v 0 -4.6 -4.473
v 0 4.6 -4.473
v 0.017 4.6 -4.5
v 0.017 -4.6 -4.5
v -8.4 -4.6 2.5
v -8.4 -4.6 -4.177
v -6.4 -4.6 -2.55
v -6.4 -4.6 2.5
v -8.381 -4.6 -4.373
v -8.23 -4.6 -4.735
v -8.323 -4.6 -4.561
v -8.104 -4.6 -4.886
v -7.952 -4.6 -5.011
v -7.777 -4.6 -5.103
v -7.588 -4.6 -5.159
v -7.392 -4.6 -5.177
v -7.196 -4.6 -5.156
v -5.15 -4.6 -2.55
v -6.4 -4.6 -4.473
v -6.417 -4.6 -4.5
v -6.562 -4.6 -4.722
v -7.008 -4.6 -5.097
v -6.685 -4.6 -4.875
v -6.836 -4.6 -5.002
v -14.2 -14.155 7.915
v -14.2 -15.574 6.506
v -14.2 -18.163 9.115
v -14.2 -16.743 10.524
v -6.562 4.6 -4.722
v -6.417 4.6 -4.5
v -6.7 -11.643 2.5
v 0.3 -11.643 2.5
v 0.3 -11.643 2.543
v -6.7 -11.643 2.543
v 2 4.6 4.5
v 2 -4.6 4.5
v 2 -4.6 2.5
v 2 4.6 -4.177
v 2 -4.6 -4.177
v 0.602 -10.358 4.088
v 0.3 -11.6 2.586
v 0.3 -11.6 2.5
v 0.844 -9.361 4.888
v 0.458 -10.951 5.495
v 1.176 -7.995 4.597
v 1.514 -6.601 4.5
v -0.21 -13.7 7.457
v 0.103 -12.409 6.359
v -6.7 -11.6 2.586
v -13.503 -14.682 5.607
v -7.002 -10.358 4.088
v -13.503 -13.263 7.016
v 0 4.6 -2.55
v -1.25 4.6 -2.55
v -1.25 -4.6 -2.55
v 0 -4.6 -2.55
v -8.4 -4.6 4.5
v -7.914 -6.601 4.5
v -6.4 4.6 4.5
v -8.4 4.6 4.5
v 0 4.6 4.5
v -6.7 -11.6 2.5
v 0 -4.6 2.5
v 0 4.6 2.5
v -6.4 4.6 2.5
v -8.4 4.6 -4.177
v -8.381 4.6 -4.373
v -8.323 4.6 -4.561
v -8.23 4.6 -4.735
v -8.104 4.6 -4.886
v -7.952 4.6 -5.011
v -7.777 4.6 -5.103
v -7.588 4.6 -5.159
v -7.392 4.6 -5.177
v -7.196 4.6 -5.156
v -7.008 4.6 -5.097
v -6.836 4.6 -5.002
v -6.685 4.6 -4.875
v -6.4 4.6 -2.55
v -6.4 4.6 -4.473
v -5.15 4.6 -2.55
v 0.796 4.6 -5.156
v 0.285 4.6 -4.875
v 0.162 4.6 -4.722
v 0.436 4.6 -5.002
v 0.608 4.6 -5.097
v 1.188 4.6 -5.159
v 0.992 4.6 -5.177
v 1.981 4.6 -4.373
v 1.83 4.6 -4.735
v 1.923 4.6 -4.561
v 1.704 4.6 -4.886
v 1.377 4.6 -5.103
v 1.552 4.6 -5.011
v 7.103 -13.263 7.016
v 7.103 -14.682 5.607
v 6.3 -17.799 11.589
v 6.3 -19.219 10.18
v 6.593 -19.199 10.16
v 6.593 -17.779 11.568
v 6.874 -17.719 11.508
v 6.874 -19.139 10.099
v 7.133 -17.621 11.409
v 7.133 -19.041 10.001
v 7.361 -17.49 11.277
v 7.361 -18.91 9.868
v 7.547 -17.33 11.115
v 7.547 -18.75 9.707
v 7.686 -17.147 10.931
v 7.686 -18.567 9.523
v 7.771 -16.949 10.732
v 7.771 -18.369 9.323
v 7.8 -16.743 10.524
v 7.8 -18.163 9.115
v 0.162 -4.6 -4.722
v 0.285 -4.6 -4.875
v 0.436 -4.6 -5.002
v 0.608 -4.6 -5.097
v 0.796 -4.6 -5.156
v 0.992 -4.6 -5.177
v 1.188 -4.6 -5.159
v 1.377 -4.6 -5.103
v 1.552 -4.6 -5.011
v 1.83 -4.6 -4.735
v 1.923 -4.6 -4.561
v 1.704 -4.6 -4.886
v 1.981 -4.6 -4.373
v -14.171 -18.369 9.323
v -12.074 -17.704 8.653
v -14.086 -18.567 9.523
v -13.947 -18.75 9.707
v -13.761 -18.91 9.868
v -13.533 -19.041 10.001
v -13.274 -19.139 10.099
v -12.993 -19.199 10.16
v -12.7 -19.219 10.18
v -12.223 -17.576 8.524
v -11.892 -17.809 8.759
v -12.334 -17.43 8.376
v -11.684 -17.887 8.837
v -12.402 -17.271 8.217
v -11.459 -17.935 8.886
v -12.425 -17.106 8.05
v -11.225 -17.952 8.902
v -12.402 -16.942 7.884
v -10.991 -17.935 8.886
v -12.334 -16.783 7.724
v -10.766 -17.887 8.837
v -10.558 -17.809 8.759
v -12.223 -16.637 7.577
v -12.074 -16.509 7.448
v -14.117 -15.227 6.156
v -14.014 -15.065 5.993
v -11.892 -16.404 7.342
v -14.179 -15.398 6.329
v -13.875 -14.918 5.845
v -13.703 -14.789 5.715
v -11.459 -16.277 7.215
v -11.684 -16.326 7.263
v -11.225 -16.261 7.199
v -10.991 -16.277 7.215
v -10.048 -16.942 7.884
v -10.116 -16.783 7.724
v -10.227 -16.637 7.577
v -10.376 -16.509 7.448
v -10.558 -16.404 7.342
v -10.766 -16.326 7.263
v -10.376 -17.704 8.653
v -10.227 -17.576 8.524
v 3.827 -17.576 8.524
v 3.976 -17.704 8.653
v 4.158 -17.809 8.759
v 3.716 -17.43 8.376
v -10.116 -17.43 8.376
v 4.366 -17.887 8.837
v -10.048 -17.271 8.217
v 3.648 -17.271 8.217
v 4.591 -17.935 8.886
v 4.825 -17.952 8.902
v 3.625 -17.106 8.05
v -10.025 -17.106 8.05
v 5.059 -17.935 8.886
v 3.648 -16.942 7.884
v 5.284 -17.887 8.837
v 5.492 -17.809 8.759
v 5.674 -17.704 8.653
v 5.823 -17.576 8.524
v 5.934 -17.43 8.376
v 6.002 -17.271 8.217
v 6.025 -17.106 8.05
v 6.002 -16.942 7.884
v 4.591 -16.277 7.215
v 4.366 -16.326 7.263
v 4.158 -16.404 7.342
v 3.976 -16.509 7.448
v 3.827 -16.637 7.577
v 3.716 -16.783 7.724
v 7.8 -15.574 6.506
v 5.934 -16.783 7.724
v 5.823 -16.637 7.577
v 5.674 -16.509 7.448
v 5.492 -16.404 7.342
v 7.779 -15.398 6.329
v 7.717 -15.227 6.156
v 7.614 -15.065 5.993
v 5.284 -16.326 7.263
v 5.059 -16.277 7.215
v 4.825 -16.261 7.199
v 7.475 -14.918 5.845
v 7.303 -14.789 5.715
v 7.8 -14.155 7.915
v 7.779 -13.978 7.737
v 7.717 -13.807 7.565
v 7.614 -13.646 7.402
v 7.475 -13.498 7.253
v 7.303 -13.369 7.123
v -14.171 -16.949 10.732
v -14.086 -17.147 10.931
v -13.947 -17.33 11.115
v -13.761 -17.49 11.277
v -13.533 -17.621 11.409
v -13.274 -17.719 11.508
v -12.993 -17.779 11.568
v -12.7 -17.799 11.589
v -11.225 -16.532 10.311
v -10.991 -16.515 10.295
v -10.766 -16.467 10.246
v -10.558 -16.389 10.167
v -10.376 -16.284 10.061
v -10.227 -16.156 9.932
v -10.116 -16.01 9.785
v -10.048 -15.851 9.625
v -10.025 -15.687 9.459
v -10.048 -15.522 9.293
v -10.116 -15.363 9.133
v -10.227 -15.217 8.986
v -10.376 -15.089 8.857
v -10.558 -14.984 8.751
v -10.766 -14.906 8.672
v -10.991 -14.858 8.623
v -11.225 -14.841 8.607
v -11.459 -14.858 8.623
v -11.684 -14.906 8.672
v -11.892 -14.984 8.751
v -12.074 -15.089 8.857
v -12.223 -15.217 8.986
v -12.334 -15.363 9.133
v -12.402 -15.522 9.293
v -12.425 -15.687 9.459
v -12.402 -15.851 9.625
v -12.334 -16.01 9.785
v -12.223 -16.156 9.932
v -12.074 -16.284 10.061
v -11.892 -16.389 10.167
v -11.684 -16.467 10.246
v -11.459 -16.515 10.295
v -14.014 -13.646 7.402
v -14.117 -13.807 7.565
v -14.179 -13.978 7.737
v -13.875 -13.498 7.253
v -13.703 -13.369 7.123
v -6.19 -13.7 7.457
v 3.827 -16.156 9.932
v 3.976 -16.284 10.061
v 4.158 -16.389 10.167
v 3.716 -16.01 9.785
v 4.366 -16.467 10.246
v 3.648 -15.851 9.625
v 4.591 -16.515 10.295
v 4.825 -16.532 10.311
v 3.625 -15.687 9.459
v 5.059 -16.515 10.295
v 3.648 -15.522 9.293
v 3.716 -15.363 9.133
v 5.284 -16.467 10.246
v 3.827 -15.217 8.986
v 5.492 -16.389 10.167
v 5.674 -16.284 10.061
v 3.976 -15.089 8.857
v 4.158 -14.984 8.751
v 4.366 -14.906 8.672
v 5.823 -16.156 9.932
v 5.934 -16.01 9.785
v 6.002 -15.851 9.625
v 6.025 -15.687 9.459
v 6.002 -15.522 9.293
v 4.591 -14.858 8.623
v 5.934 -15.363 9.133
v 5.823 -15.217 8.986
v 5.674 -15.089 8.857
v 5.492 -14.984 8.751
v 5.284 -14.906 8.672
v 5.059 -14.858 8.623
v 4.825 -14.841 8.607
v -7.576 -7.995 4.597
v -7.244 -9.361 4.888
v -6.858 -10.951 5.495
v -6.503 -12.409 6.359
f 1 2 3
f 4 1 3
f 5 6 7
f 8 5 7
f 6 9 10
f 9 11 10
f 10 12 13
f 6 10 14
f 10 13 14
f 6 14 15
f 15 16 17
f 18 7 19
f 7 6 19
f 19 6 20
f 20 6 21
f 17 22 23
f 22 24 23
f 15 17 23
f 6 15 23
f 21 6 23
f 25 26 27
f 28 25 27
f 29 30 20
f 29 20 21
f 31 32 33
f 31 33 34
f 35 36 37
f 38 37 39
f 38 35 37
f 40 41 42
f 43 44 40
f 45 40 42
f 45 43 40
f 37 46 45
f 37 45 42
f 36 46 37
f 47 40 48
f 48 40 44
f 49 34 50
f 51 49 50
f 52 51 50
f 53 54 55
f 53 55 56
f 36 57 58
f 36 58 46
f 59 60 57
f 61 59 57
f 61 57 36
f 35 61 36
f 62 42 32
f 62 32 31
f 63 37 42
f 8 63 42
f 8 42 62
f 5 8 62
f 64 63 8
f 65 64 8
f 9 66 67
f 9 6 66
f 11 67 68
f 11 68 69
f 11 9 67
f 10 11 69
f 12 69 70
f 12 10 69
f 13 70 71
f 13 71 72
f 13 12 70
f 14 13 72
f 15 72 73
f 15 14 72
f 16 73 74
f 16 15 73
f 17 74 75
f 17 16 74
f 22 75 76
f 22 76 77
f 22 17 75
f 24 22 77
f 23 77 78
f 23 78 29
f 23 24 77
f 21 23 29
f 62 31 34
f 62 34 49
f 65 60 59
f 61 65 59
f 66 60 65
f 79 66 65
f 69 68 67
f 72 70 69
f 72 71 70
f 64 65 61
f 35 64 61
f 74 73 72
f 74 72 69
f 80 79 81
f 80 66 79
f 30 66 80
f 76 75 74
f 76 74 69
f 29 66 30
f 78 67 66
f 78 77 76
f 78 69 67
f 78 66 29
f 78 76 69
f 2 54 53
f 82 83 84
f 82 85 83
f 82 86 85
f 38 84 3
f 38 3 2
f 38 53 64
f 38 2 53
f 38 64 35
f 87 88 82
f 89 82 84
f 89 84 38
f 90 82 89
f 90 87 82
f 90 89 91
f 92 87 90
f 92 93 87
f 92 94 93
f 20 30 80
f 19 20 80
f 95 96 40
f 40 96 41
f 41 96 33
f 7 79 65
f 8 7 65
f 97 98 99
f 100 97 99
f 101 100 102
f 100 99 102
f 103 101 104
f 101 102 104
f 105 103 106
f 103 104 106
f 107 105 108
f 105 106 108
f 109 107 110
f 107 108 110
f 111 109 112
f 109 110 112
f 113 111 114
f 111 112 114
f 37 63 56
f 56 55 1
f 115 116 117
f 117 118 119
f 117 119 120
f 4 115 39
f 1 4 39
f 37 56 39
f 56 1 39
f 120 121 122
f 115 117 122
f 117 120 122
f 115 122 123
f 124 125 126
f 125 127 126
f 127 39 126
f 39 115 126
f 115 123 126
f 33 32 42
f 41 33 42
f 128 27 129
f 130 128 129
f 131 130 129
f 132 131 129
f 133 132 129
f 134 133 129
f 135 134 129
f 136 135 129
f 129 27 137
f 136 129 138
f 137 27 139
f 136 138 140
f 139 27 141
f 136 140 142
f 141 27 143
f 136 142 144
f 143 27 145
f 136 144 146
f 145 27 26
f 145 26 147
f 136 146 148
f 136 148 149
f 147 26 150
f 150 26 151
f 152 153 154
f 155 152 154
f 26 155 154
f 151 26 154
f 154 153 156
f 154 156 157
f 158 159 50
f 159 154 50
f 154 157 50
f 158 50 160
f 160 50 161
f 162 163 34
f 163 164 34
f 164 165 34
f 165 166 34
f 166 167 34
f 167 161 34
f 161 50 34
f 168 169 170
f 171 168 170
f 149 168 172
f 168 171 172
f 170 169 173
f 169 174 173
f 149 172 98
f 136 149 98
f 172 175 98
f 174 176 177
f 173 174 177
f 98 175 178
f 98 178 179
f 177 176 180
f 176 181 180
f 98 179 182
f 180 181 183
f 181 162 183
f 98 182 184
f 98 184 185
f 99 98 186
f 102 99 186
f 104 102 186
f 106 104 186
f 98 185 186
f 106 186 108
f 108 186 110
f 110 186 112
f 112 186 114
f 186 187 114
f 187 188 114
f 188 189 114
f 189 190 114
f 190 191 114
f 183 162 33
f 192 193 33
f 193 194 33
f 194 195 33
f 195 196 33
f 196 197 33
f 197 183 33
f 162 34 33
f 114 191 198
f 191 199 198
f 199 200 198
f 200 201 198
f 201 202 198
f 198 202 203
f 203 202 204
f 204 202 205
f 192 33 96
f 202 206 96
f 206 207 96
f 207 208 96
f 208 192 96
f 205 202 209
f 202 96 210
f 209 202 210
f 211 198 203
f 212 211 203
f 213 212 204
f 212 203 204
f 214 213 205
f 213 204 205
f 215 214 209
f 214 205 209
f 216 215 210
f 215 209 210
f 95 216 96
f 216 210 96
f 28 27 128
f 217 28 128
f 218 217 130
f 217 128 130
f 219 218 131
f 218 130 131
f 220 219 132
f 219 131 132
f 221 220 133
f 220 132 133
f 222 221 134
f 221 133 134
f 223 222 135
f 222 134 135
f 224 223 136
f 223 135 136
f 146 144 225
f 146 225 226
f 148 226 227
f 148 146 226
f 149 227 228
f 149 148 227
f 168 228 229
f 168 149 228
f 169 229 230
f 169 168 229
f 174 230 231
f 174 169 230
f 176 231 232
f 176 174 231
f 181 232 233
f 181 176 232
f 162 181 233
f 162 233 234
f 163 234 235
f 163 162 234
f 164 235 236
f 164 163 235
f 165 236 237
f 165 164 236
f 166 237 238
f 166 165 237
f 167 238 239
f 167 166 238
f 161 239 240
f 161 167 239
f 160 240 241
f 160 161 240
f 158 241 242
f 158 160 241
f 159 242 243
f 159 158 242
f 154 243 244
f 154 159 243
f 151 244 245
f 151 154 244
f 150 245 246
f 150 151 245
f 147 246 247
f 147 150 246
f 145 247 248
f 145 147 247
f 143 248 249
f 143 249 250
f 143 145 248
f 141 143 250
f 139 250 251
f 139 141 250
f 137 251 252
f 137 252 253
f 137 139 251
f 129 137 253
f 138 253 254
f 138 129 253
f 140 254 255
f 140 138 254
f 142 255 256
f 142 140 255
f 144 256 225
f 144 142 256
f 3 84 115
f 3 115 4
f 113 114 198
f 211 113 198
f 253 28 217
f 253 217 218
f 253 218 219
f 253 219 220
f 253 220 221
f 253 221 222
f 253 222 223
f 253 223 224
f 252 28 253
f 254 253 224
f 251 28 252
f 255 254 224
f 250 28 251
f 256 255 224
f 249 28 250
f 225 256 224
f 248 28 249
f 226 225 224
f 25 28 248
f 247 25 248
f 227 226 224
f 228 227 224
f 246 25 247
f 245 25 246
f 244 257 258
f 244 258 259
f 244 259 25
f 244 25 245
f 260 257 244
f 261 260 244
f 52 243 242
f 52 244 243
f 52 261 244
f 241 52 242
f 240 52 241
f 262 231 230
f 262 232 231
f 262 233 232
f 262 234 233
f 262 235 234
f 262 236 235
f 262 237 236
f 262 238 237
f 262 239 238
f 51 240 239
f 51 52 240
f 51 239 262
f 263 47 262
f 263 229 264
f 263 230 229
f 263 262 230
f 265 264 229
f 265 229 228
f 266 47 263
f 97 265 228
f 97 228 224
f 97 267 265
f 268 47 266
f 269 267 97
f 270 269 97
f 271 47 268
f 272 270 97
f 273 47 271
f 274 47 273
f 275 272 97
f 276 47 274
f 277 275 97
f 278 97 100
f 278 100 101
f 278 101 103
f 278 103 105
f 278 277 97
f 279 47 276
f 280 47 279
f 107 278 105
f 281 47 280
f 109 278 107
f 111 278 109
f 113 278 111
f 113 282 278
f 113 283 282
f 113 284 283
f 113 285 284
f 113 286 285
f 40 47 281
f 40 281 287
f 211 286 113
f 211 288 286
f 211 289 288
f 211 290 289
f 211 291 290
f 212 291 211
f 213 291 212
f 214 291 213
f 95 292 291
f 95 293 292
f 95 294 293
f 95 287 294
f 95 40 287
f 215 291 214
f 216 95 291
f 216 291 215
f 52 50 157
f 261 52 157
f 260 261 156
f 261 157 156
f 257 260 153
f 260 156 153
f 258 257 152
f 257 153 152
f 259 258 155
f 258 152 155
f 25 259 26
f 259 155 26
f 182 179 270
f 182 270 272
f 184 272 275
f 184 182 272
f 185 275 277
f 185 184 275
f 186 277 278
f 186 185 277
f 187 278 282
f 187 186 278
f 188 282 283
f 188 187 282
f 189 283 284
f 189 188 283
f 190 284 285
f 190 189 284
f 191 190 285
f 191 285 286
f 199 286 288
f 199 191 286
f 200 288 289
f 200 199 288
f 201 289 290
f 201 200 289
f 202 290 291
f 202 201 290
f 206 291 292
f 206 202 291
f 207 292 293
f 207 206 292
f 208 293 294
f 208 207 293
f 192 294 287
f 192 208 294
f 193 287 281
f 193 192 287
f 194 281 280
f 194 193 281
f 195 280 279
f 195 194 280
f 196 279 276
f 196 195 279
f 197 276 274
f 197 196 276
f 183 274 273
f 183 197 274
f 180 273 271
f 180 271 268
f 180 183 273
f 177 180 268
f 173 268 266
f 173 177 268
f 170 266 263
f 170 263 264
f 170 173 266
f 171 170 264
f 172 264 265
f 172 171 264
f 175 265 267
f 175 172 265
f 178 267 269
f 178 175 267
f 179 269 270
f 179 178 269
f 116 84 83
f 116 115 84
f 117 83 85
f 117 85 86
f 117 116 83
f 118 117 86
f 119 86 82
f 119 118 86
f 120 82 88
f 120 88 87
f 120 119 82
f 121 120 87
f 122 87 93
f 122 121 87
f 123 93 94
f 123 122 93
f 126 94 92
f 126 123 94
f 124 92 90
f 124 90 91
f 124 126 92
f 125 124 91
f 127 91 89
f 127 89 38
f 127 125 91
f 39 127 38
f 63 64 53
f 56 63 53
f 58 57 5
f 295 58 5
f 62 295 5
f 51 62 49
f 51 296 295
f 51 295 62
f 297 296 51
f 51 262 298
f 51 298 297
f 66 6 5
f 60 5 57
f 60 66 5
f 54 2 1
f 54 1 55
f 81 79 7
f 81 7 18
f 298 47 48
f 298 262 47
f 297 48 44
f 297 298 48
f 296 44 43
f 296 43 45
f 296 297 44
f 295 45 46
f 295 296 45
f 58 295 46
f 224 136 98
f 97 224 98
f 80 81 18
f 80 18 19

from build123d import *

# Parameters (mm, degrees)
SKETCH2_W           = 8.999610642
SKETCH2_H           = 9.2
BOSS_EXTRUDE1_DEPTH = 2
BOSS_EXTRUDE2_START = 6.4
SKETCH3_W           = 8.999610642
SKETCH3_H           = 9.2
BOSS_EXTRUDE2_DEPTH = 2
SKETCH4_W           = 1.999805321
SKETCH4_H           = 9.2
BOSS_EXTRUDE3_DEPTH = 7
CUT_EXTRUDE2_DEPTH  = 9.2
BOSS_EXTRUDE4_DEPTH = 9.2
FILLET1_R           = 1
BOSS_EXTRUDE6_DEPTH = 1.999805321
SKETCH11_R          = 1.2
BOSS_EXTRUDE7_DEPTH = 2
FILLET2_R           = 10
SKETCH13_W          = 7
SKETCH13_H          = 0.042993575
BOSS_EXTRUDE8_DEPTH = 1


with BuildPart() as part:
    # Sketch2 → Boss-Extrude1 (new body)
    with BuildSketch(Plane(origin=(0, 0, 0), x_dir=(0, 0, -1), z_dir=(1, 0, 0))):
        Rectangle(SKETCH2_W, SKETCH2_H)
    extrude(amount=BOSS_EXTRUDE1_DEPTH)



with BuildPart() as body_2:
    # Sketch3 → Boss-Extrude2 (new body)
    with BuildSketch(Plane.ZY.offset(BOSS_EXTRUDE2_START)):
        Rectangle(SKETCH3_W, SKETCH3_H)
    extrude(amount=BOSS_EXTRUDE2_DEPTH)


with BuildPart() as part_1:
    add(part.part)

    add(body_2.part)  # Boss-Extrude3 merges body 2
    # Sketch4 → Boss-Extrude3 (add)
    with BuildSketch(Plane.ZY):
        with Locations((3.499902661, 0)):
            Rectangle(SKETCH4_W, SKETCH4_H)
    extrude(amount=BOSS_EXTRUDE3_DEPTH)

    # Sketch5 → Cut-Extrude2 (cut)
    with BuildSketch(Plane(origin=(0, 4.6, 0), x_dir=(1, 0, 0), z_dir=(0, 1, 0))):
        Polygon((-5.15, 2.55), (-1.25, 2.55), (0, 4.473076923), (0, 4.499805321), (0.017373458, 4.499805321), (2, 7.55), (-8.4, 7.55), (-6.417373458, 4.499805321), (-6.4, 4.499805321), (-6.4, 4.473076923), align=None)
        Polygon((0, 4.499805321), (0, 4.473076923), (0.017373458, 4.499805321), align=None)
        Polygon((-6.417373458, 4.499805321), (-6.4, 4.473076923), (-6.4, 4.499805321), align=None)
    extrude(amount=-CUT_EXTRUDE2_DEPTH, mode=Mode.SUBTRACT)

    # Sketch5<3> → Boss-Extrude4 (add)
    with BuildSketch(Plane(origin=(0, 4.6, 0), x_dir=(1, 0, 0), z_dir=(0, 1, 0))):
        Polygon((-6.4, 2.55), (-5.15, 2.55), (-6.4, 4.473076923), align=None)
        Polygon((-8.4, 4.499805321), (-6.417373458, 4.499805321), (-8.4, 7.55), align=None)
        Polygon((-1.25, 2.55), (0, 2.55), (0, 4.473076923), align=None)
        Polygon((0.017373458, 4.499805321), (2, 4.499805321), (2, 7.55), align=None)
    extrude(amount=-BOSS_EXTRUDE4_DEPTH)

    # Fillet1
    fillet1_edges = [part_1.edges().sort_by_distance(p)[0] for p in [
        (-8.4, 0, -7.55),
        (2, 0, -7.55),
    ]]
    fillet(fillet1_edges, radius=FILLET1_R)

    # Sketch9 → Boss-Extrude6 (add)
    with BuildSketch(Plane.XY.offset(4.499805321)):
        Polygon((-6.7, -11.6), (0.3, -11.6), (2, -4.6), (-8.4, -4.6), align=None)
    extrude(amount=-BOSS_EXTRUDE6_DEPTH)

    # Sketch11 → Boss-Extrude7 (add)
    with BuildSketch(Plane(origin=(0, -4.596209487, -4.559766639), x_dir=(1, 0, 0), z_dir=(0, 0.7099156022207138, 0.7042867581628958))):
        with BuildLine():
            Line((7.8, -19.262920267), (7.8, -15.587764453))
            ThreePointArc((7.8, -15.587764453), (7.614381512, -14.864991154), (7.103465011, -14.321097971))
            Line((7.103465011, -14.321097971), (0.3, -10.005560954))
            Line((0.3, -10.005560954), (-6.7, -10.005560954))
            Line((-6.7, -10.005560954), (-13.503465011, -14.321097971))
            ThreePointArc((-13.503465011, -14.321097971), (-14.014381512, -14.864991154), (-14.2, -15.587764453))
            Line((-14.2, -15.587764453), (-14.2, -19.262920267))
            ThreePointArc((-14.2, -19.262920267), (-13.760660172, -20.323580438), (-12.7, -20.762920267))
            Line((-12.7, -20.762920267), (6.3, -20.762920267))
            ThreePointArc((6.3, -20.762920267), (7.360660172, -20.323580438), (7.8, -19.262920267))
        make_face()
        with Locations(Location((4.825, -17.762920267, 0), (0, 0, 270))):
            Circle(SKETCH11_R, mode=Mode.SUBTRACT)
        with Locations(Location((-11.225, -17.762920267, 0), (0, 0, 270))):
            Circle(SKETCH11_R, mode=Mode.SUBTRACT)
    extrude(amount=BOSS_EXTRUDE7_DEPTH)

    # Fillet2
    fillet2_edges = [part_1.edges().sort_by_distance(p)[0] for p in [
        (-3.2, -10.766712787, 4.499805321),
    ]]
    fillet(fillet2_edges, radius=FILLET2_R)

    # Sketch13 → Boss-Extrude8 (add)
    with BuildSketch(Plane(origin=(0, 0, 2.5), x_dir=(-1, 0, 0), z_dir=(0, 0, -1))):
        with Locations((3.2, -11.621496787)):
            Rectangle(SKETCH13_W, SKETCH13_H)
    extrude(amount=-BOSS_EXTRUDE8_DEPTH)


solid = part_1.part
